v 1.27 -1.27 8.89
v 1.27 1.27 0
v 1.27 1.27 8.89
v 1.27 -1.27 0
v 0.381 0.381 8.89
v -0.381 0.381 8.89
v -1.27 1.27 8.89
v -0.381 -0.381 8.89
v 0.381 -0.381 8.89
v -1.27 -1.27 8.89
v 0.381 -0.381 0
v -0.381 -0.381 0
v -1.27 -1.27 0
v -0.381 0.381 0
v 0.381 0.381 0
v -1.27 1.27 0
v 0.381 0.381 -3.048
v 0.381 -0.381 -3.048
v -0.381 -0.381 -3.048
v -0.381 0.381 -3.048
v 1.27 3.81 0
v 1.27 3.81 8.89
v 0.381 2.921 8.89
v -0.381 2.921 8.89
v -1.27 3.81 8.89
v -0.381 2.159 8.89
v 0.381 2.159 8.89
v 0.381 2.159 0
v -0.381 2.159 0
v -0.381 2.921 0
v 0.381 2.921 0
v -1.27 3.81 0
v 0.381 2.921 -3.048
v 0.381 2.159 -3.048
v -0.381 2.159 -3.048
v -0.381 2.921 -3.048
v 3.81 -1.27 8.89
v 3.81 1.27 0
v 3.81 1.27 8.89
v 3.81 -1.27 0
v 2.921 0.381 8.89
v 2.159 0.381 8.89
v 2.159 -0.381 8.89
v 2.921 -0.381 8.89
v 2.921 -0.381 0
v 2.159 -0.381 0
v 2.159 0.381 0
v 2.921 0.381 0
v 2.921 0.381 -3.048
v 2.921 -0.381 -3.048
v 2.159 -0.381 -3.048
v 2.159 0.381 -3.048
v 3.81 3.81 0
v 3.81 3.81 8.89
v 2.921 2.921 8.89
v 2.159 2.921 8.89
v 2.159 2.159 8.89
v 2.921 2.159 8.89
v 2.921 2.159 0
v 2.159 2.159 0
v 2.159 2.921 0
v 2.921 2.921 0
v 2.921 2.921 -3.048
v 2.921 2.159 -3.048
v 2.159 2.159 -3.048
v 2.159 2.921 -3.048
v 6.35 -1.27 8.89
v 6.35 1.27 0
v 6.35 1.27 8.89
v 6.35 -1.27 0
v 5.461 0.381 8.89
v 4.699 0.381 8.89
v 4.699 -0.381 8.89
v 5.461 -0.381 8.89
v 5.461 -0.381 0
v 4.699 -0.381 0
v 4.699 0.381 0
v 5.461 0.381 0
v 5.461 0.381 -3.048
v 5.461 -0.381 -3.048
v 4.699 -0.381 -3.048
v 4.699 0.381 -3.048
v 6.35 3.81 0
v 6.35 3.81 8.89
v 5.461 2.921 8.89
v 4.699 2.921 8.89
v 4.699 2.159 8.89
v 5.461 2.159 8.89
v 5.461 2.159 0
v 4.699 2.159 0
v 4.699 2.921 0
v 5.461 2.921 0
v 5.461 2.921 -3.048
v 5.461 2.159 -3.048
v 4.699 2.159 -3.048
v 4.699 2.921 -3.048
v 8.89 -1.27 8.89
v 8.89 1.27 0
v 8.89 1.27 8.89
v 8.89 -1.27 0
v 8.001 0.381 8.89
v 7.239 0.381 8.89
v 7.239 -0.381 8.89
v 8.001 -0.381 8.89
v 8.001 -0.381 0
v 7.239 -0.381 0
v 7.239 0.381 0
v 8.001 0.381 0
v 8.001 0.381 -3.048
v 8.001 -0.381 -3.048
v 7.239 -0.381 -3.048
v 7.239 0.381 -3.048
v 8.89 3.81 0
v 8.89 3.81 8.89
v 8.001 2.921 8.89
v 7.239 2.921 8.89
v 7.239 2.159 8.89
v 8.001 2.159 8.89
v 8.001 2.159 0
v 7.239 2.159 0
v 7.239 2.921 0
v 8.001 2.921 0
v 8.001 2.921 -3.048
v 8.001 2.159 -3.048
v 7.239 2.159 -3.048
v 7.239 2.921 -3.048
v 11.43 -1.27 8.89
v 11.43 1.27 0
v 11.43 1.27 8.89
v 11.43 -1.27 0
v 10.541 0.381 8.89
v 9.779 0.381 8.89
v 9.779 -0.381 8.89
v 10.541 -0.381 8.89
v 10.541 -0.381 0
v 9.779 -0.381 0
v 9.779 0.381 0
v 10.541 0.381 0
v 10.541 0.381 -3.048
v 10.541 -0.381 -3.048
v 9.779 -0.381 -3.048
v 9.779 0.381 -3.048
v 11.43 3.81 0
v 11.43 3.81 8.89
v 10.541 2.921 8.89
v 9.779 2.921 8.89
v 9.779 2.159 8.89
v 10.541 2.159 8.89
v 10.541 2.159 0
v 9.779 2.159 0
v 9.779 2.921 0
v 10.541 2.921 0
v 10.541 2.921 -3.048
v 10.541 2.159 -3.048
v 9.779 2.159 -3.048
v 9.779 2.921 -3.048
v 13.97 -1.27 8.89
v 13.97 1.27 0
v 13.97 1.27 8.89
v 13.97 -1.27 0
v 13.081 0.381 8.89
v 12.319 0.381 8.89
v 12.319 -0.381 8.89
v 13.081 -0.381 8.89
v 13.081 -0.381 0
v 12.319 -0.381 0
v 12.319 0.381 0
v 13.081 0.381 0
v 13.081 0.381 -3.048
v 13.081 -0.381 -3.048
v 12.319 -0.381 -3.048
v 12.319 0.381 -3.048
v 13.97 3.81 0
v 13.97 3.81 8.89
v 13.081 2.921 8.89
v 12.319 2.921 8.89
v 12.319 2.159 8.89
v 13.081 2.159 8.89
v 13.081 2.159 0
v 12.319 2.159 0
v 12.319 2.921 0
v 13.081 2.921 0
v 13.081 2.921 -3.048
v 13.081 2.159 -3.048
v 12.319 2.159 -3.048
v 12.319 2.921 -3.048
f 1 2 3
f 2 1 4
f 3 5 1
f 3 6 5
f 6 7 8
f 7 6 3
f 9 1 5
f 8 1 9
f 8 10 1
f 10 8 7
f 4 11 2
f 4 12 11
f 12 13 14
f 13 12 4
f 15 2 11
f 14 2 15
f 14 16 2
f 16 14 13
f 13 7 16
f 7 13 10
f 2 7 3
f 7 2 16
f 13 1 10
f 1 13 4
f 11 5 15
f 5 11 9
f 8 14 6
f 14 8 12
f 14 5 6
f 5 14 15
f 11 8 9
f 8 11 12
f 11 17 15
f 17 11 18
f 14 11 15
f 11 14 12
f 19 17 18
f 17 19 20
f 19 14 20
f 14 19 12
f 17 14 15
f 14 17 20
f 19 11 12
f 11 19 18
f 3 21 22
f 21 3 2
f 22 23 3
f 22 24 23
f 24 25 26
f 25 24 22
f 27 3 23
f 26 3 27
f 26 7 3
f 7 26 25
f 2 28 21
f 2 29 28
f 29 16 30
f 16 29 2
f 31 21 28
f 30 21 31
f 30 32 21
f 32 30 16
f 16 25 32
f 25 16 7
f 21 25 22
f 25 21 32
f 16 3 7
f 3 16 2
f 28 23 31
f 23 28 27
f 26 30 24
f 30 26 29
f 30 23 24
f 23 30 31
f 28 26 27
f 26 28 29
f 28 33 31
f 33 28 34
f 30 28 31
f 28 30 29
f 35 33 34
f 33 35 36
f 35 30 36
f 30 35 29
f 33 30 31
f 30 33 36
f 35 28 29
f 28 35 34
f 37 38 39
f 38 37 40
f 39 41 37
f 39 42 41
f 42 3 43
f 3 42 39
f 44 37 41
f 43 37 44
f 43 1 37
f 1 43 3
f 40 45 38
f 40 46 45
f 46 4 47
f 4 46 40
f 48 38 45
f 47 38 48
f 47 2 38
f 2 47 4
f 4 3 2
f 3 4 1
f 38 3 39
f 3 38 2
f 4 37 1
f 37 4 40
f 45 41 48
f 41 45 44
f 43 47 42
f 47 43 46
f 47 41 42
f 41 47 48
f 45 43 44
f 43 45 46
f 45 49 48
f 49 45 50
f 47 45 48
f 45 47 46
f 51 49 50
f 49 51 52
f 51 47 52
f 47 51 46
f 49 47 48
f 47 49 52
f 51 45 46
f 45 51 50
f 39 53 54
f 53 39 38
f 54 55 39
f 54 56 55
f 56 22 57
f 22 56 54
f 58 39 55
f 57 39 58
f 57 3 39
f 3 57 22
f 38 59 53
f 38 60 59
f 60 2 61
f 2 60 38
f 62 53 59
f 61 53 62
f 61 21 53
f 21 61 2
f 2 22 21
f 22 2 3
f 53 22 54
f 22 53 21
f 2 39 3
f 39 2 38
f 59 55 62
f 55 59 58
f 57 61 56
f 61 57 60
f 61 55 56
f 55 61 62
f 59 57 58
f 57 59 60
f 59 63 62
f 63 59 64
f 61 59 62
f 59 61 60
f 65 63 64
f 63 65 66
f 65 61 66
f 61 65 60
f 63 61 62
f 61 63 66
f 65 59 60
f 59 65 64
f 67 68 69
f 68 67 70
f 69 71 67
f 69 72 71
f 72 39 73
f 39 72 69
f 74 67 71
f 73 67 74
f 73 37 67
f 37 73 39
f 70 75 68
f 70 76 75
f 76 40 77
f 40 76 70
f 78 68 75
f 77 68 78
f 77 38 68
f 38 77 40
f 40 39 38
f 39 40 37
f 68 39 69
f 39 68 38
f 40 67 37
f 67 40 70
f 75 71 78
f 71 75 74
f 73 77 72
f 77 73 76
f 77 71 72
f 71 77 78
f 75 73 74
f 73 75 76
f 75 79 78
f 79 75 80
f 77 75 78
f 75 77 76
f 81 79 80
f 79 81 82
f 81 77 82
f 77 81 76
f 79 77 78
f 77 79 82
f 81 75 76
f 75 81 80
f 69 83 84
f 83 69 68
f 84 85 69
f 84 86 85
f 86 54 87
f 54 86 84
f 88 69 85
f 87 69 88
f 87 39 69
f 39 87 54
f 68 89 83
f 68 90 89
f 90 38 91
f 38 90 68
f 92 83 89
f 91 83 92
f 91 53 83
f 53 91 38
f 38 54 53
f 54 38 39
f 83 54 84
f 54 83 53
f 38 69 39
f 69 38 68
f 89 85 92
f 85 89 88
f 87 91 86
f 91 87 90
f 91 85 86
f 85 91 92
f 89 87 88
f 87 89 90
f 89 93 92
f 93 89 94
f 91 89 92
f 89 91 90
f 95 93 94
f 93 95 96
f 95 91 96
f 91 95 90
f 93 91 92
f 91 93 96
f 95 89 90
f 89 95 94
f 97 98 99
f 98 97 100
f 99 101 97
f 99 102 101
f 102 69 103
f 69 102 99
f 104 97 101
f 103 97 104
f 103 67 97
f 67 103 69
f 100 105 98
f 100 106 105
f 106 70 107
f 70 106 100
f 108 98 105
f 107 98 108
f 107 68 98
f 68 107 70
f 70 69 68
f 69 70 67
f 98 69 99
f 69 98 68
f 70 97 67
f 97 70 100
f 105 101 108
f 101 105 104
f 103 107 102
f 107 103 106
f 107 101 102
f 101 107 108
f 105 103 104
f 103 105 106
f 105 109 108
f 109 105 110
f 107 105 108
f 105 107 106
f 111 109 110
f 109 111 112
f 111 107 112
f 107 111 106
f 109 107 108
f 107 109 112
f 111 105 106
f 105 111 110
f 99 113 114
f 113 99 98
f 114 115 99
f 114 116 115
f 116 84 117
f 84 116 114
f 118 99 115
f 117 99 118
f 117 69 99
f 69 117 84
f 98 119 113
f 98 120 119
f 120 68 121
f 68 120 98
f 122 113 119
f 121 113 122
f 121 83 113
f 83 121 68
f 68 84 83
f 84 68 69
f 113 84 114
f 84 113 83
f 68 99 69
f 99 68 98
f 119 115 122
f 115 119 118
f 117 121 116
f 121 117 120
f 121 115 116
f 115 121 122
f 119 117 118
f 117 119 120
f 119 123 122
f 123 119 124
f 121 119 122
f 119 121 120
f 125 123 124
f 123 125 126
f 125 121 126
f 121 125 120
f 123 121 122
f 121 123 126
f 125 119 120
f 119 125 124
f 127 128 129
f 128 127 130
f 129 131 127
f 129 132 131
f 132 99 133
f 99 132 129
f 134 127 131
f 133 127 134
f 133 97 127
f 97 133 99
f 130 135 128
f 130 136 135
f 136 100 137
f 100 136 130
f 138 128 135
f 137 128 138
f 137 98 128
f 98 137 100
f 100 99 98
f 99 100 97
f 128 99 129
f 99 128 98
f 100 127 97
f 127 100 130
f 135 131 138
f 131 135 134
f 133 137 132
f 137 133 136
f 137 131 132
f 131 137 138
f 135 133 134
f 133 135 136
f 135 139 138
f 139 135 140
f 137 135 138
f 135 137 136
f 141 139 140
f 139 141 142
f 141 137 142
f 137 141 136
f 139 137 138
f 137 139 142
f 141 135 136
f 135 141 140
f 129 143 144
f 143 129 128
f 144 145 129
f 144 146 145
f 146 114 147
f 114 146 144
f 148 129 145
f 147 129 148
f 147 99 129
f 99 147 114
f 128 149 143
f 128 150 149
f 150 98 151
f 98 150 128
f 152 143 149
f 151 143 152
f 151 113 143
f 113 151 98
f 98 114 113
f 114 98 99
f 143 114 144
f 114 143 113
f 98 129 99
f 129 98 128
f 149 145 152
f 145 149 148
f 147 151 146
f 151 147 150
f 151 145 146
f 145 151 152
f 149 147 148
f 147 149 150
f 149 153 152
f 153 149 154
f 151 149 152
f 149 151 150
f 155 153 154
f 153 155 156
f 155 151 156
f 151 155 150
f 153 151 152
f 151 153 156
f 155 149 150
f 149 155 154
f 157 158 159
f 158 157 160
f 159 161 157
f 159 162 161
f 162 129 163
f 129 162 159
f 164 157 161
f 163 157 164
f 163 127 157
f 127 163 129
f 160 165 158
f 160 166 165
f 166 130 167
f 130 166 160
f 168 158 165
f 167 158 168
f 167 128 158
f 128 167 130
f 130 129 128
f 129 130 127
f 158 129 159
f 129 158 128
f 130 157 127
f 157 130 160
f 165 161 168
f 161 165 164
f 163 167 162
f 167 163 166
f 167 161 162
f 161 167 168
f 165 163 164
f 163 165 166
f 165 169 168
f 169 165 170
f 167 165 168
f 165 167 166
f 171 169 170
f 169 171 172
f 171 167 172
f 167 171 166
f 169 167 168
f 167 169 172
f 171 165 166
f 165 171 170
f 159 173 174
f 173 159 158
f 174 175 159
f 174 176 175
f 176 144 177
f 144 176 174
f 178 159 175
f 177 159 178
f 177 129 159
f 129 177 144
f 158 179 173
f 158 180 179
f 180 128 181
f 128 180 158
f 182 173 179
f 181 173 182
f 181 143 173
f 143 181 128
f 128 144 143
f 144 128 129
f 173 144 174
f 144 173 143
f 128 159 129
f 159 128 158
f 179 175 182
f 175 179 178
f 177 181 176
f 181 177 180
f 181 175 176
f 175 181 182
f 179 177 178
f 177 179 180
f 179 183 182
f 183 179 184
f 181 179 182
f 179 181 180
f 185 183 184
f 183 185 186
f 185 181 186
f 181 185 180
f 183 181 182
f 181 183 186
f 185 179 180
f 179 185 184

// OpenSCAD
module pinF(x,y){
    millis= 0.0254;
    pin=    30*millis;
    pinH=   450*millis;
    space=  100*millis;
    cut=    10*millis;
    mXY=[   [0,0,0], 
            [0,1,0],
            [1,0,0],
            [1,1,0]]; //mirror XY
for (x=[0:1:x-1], y=[0:1:y-1]) translate([x*2.54,y*2.54,0]) {
    color("gold")
    translate ([-pin/2,-pin/2,-120*millis]) cube([pin,pin,120*millis]);    
    color([0.15,0.15,0.15,1]) 
    difference(){
        translate(-[space,space]/2) cube([space,space,pinH-space]);
//        for (i=mXY) mirror(i) translate([space,space]/2)cylinder(pinH,cut,cut,$fn=8);
        translate ([-pin/2,-pin/2,0]) cube([pin,pin,pinH]);    
    }
}
}
pinF(6,2);
